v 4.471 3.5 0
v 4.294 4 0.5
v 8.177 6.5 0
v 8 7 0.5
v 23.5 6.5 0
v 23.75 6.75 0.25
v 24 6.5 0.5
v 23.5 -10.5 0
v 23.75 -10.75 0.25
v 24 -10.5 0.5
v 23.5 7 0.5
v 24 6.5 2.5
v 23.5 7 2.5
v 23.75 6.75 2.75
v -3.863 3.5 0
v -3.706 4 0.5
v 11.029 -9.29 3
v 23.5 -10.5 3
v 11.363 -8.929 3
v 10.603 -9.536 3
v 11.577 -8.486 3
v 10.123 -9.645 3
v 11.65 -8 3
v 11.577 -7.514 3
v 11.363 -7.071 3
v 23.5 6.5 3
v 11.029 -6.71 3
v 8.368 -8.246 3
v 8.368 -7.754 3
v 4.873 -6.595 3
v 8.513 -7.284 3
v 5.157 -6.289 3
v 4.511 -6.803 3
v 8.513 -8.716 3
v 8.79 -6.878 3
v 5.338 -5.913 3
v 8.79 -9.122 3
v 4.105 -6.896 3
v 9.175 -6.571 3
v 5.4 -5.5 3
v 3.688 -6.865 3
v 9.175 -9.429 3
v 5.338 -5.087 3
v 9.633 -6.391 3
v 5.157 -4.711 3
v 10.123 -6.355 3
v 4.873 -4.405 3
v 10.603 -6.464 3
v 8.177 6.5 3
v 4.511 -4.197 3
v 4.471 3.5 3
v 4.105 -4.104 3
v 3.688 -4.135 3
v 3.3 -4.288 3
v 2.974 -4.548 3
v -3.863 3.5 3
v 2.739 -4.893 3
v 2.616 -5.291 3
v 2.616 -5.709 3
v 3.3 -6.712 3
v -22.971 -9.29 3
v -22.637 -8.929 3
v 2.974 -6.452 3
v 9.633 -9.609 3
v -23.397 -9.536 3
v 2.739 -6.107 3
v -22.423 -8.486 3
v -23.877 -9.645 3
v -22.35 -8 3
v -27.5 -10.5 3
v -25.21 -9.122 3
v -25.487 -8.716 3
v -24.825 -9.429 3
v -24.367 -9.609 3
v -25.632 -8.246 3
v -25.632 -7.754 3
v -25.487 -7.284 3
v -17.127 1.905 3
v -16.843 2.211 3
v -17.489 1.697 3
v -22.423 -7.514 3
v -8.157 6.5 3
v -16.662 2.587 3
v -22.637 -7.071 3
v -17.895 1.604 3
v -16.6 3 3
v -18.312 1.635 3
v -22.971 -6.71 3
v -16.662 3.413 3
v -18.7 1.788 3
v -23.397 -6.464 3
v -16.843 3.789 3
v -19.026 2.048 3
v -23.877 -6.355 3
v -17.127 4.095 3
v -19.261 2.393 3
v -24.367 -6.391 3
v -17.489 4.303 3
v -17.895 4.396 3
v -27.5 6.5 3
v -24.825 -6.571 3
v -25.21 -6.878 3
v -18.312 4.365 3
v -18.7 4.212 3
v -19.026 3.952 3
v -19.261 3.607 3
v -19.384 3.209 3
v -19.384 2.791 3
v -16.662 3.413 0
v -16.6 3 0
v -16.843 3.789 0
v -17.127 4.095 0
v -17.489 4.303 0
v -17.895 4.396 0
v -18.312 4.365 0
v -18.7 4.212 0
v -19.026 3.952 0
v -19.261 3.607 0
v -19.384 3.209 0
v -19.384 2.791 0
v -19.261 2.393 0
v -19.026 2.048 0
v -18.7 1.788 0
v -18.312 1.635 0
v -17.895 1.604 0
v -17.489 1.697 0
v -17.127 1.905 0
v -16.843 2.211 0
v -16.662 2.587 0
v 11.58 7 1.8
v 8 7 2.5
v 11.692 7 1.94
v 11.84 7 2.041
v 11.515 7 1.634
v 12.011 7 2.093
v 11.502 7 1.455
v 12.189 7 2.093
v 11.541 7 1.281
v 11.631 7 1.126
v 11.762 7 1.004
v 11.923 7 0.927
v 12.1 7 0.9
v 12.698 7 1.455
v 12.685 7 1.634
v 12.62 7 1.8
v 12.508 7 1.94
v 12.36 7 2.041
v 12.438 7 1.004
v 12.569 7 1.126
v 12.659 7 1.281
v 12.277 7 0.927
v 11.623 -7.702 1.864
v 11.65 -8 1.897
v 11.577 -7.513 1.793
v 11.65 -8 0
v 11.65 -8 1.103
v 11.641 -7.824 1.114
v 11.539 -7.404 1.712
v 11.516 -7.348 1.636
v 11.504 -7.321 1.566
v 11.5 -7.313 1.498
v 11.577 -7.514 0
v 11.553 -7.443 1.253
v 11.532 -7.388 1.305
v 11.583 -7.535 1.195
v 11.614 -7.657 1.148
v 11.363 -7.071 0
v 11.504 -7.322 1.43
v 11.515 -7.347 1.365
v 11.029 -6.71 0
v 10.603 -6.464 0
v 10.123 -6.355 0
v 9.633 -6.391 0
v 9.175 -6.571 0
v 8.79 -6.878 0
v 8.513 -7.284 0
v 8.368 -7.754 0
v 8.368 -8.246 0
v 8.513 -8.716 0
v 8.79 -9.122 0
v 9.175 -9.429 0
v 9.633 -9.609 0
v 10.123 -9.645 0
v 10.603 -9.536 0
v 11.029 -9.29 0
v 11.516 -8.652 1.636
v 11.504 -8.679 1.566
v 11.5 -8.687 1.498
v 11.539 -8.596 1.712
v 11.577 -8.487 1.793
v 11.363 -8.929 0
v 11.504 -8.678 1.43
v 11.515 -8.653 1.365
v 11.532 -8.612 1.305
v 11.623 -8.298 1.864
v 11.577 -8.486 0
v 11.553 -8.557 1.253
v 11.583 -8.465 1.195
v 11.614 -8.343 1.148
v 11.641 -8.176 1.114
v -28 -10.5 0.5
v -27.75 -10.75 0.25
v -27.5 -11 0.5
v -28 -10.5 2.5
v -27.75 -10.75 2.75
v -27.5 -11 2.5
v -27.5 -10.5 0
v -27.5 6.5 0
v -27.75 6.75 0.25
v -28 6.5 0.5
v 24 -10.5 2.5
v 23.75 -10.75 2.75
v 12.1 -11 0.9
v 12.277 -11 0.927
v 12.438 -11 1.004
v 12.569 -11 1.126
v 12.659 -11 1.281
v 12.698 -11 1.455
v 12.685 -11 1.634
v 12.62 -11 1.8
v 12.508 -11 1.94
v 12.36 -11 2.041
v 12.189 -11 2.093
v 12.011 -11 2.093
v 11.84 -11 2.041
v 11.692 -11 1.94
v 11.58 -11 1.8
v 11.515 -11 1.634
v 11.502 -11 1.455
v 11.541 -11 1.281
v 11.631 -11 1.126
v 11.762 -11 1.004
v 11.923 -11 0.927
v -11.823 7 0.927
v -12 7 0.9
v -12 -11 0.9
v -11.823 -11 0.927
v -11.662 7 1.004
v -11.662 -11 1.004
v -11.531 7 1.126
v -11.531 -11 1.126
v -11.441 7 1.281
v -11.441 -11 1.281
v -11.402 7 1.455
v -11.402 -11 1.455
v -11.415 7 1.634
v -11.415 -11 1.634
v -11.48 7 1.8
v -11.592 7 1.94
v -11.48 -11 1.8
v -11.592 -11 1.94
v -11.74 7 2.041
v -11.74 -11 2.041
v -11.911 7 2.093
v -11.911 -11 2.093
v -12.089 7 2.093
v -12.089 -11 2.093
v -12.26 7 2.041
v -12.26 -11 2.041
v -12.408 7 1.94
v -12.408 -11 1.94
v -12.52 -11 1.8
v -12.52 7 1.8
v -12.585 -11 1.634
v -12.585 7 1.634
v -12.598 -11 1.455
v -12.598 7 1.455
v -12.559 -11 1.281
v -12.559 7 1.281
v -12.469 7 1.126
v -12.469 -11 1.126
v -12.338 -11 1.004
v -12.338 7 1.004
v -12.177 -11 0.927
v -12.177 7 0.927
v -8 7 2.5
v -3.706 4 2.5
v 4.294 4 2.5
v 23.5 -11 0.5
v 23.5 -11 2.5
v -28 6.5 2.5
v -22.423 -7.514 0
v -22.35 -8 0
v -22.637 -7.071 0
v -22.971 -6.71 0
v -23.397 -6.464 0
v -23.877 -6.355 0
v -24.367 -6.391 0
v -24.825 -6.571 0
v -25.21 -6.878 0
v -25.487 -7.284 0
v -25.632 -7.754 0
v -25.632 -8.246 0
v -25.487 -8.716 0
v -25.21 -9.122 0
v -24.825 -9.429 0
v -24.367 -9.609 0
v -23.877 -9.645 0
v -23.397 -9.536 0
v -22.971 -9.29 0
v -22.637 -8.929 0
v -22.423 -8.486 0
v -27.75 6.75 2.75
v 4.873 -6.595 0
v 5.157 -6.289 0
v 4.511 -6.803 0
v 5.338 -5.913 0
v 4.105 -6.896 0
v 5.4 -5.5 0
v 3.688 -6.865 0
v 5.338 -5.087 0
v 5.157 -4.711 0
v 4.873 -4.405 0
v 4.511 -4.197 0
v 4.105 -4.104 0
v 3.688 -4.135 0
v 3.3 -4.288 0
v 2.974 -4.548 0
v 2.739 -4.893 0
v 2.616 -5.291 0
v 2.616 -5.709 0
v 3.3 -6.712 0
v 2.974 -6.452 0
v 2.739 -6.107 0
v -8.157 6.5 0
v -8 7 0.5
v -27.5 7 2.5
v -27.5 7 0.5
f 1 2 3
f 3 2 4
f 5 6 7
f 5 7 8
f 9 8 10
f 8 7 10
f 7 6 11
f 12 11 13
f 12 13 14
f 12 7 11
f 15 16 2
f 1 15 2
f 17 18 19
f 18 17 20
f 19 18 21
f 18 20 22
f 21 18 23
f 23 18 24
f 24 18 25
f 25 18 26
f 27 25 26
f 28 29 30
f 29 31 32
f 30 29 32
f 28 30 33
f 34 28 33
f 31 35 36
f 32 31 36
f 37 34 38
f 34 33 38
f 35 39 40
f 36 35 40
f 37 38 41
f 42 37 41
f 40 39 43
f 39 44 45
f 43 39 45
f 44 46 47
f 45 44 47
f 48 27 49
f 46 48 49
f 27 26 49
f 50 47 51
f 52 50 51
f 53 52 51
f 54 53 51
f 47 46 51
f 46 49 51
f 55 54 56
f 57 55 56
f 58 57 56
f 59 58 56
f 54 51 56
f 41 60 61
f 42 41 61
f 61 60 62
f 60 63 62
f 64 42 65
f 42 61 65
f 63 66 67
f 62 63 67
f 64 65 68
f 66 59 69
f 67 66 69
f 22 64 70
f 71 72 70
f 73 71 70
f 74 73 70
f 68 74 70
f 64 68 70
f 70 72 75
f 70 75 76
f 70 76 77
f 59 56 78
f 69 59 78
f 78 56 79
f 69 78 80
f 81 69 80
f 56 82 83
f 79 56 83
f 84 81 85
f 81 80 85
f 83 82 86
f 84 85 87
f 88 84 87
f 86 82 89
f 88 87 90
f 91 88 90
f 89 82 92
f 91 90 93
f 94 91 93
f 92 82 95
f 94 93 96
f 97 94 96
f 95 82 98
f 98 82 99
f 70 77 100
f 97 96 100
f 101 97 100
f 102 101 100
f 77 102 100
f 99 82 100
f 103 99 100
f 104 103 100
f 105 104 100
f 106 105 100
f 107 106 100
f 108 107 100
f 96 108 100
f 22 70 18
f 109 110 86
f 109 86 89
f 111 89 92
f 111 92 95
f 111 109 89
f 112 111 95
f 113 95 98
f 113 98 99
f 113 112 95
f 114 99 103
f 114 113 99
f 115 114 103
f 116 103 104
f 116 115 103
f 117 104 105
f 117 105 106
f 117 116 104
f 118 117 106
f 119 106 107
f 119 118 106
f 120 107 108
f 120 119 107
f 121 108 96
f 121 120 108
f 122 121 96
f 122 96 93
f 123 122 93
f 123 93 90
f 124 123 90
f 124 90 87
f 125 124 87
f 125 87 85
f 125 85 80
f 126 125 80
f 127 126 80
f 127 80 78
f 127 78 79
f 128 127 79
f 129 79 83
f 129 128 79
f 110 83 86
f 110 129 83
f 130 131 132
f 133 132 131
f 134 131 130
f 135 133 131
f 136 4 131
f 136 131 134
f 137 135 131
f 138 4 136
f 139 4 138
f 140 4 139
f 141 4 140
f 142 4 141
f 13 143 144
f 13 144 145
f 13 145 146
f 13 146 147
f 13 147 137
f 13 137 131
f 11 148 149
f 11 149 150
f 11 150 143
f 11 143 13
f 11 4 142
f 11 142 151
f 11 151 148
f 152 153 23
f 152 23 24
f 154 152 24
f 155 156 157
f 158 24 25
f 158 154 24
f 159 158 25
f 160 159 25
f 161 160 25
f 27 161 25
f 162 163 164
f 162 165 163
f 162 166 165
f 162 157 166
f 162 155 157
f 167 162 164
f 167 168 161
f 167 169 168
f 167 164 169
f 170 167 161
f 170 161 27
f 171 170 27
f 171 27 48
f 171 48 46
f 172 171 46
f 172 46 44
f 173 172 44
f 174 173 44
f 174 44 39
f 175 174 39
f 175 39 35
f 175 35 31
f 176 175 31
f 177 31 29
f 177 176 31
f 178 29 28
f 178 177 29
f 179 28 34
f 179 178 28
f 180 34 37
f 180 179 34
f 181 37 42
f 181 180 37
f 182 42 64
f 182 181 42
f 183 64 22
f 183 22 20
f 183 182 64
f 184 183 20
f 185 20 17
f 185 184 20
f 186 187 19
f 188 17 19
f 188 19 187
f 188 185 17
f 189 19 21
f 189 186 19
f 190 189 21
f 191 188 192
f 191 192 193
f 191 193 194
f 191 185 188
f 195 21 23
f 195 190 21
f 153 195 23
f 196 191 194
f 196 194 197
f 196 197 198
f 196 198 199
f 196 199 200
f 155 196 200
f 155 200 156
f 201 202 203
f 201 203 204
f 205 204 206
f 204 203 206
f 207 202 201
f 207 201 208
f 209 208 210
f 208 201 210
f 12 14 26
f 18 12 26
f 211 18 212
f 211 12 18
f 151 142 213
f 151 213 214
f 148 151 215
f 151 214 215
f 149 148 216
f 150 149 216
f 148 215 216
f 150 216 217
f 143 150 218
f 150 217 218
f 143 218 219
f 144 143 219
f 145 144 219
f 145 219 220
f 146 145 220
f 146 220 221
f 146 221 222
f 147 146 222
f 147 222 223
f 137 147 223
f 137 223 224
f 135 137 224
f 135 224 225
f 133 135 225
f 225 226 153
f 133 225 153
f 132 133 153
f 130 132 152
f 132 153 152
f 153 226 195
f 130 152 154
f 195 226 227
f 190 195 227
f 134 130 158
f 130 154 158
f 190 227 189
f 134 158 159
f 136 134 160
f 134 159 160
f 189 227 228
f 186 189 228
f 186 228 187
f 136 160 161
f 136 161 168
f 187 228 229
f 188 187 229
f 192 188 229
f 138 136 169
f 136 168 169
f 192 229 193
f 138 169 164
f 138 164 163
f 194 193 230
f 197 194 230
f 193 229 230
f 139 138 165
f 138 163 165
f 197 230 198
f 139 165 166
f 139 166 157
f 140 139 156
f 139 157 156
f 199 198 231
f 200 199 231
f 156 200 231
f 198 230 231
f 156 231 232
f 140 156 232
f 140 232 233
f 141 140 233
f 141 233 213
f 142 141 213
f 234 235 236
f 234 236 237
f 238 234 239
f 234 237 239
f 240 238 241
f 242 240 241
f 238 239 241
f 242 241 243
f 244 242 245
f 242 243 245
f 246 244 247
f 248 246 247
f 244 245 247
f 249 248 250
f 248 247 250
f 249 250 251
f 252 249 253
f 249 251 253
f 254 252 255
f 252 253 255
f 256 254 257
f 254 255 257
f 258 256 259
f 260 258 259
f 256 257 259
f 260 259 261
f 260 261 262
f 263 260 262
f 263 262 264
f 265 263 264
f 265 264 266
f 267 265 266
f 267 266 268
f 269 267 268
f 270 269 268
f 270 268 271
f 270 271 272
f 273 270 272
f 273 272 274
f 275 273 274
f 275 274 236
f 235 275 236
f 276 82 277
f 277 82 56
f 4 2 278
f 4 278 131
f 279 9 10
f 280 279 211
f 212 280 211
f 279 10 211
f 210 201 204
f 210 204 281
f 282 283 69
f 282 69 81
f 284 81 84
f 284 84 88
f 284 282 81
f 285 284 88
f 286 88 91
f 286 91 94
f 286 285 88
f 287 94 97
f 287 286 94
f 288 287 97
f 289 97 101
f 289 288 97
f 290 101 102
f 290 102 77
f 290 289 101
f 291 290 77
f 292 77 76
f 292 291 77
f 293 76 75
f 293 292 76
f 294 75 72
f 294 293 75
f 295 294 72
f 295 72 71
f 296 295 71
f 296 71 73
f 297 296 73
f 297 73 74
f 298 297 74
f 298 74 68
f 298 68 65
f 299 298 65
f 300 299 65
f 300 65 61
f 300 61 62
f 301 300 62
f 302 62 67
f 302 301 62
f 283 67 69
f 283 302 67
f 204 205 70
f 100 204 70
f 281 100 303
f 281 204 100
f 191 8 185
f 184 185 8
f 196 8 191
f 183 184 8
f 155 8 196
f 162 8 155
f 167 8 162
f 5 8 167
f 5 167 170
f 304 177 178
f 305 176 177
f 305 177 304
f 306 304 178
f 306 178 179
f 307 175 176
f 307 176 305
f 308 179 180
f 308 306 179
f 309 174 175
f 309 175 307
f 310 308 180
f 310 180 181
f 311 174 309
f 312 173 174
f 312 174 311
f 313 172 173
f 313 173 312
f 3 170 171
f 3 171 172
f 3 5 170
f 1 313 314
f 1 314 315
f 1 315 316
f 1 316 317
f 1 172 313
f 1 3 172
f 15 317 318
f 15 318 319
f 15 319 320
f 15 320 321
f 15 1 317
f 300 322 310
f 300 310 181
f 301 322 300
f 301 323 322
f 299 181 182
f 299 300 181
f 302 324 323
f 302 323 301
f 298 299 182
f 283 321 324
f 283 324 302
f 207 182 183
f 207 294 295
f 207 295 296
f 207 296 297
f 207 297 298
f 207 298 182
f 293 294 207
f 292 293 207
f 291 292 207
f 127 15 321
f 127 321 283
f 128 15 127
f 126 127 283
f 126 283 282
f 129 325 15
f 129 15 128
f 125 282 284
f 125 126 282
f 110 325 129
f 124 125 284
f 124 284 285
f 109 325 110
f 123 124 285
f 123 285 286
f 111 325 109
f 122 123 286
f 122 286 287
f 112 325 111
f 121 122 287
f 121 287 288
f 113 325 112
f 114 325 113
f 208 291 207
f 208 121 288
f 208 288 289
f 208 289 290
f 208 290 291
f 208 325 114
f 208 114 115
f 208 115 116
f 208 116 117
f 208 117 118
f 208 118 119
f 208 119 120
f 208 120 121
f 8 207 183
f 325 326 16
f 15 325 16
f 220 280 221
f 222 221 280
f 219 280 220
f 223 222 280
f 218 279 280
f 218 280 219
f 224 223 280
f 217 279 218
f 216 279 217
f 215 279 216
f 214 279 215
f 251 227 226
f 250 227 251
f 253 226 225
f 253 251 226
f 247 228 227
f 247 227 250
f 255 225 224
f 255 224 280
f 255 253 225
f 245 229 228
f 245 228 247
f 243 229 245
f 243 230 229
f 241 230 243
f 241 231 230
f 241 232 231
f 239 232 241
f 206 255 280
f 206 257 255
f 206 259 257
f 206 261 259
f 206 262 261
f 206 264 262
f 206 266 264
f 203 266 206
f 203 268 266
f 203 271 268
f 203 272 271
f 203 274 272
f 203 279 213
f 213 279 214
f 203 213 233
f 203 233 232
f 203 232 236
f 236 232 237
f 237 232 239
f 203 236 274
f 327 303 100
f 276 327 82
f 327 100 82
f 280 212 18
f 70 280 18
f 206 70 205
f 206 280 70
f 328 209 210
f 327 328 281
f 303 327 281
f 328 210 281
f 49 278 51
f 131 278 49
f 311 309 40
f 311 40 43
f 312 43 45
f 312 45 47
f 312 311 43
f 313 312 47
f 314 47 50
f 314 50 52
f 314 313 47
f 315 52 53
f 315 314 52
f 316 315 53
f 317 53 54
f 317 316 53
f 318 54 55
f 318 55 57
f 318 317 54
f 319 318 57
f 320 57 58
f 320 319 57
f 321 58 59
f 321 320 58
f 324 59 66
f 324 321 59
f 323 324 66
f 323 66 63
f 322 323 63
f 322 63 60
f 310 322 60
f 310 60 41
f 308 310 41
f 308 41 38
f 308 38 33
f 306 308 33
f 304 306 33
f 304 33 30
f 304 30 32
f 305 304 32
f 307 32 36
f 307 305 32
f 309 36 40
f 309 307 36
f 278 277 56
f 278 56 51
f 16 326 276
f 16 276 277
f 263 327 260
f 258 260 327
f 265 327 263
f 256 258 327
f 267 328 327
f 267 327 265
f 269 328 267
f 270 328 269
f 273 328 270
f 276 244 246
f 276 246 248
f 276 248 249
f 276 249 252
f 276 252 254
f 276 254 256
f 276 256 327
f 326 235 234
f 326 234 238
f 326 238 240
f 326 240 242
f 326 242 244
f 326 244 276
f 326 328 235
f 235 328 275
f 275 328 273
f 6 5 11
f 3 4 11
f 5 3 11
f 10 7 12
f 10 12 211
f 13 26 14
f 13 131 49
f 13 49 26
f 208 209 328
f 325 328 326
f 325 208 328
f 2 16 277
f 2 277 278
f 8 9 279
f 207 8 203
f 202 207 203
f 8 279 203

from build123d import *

# Parameters (mm, degrees)
SKETCH_1_R          = 1.4
SKETCH_1_R_2        = 1.65
EXTRUDE_1_DEPTH     = 3
SKETCH_2_R          = 0.6
CUT_EXTRUDE_1_DEPTH = 34.421549934
CHAMFER_2_SIZE      = 0.5
CHAMFER_3_SIZE      = 0.5


with BuildPart() as part:
    # 草图1 → 凸台-拉伸1 (new body)
    with BuildSketch(Plane.XY):
        Polygon((-8, 7), (-3.705865331, 4), (4.294134669, 4), (8, 7), (24, 7), (24, -11), (-28, -11), (-28, 7), align=None)
        with Locations((-18, 3)):
            Circle(SKETCH_1_R, mode=Mode.SUBTRACT)
        with Locations((4, -5.5)):
            Circle(SKETCH_1_R, mode=Mode.SUBTRACT)
        with Locations((-24, -8)):
            Circle(SKETCH_1_R_2, mode=Mode.SUBTRACT)
        with Locations((10, -8)):
            Circle(SKETCH_1_R_2, mode=Mode.SUBTRACT)
    extrude(amount=EXTRUDE_1_DEPTH)

    # 草图2 → 切除-拉伸1 (cut, through all)
    with BuildSketch(Plane.XZ.offset(11)):
        with Locations(Location((12.1, 1.5, 0), (0, 0, 270))):
            Circle(SKETCH_2_R)
        with Locations(Location((-12, 1.5, 0), (0, 0, 270))):
            Circle(SKETCH_2_R)
    extrude(amount=-CUT_EXTRUDE_1_DEPTH, mode=Mode.SUBTRACT)

    # 倒角2
    chamfer_2_edges = [part.edges().sort_by_distance(p)[0] for p in [
        (24, -2, 0),
        (24, -11, 1.5),
        (-28, -11, 1.5),
        (-28, 7, 1.5),
        (24, 7, 1.5),
        (-28, -2, 3),
        (24, -2, 3),
        (-28, -2, 0),
    ]]
    chamfer(chamfer_2_edges, length=CHAMFER_2_SIZE)

    # 倒角3
    chamfer_3_edges = [part.edges().sort_by_distance(p)[0] for p in [
        (0.294134669, 4, 0),
        (6.147067334, 5.5, 0),
        (6.147067334, 5.5, 3),
        (0.294134669, 4, 3),
        (-5.852932666, 5.5, 3),
        (-17.75, 7, 3),
        (15.75, 7, 3),
        (-2, -11, 3),
        (-2, -11, 0),
        (15.75, 7, 0),
        (-17.75, 7, 0),
        (-5.852932666, 5.5, 0),
    ]]
    chamfer(chamfer_3_edges, length=CHAMFER_3_SIZE)


solid = part.part
